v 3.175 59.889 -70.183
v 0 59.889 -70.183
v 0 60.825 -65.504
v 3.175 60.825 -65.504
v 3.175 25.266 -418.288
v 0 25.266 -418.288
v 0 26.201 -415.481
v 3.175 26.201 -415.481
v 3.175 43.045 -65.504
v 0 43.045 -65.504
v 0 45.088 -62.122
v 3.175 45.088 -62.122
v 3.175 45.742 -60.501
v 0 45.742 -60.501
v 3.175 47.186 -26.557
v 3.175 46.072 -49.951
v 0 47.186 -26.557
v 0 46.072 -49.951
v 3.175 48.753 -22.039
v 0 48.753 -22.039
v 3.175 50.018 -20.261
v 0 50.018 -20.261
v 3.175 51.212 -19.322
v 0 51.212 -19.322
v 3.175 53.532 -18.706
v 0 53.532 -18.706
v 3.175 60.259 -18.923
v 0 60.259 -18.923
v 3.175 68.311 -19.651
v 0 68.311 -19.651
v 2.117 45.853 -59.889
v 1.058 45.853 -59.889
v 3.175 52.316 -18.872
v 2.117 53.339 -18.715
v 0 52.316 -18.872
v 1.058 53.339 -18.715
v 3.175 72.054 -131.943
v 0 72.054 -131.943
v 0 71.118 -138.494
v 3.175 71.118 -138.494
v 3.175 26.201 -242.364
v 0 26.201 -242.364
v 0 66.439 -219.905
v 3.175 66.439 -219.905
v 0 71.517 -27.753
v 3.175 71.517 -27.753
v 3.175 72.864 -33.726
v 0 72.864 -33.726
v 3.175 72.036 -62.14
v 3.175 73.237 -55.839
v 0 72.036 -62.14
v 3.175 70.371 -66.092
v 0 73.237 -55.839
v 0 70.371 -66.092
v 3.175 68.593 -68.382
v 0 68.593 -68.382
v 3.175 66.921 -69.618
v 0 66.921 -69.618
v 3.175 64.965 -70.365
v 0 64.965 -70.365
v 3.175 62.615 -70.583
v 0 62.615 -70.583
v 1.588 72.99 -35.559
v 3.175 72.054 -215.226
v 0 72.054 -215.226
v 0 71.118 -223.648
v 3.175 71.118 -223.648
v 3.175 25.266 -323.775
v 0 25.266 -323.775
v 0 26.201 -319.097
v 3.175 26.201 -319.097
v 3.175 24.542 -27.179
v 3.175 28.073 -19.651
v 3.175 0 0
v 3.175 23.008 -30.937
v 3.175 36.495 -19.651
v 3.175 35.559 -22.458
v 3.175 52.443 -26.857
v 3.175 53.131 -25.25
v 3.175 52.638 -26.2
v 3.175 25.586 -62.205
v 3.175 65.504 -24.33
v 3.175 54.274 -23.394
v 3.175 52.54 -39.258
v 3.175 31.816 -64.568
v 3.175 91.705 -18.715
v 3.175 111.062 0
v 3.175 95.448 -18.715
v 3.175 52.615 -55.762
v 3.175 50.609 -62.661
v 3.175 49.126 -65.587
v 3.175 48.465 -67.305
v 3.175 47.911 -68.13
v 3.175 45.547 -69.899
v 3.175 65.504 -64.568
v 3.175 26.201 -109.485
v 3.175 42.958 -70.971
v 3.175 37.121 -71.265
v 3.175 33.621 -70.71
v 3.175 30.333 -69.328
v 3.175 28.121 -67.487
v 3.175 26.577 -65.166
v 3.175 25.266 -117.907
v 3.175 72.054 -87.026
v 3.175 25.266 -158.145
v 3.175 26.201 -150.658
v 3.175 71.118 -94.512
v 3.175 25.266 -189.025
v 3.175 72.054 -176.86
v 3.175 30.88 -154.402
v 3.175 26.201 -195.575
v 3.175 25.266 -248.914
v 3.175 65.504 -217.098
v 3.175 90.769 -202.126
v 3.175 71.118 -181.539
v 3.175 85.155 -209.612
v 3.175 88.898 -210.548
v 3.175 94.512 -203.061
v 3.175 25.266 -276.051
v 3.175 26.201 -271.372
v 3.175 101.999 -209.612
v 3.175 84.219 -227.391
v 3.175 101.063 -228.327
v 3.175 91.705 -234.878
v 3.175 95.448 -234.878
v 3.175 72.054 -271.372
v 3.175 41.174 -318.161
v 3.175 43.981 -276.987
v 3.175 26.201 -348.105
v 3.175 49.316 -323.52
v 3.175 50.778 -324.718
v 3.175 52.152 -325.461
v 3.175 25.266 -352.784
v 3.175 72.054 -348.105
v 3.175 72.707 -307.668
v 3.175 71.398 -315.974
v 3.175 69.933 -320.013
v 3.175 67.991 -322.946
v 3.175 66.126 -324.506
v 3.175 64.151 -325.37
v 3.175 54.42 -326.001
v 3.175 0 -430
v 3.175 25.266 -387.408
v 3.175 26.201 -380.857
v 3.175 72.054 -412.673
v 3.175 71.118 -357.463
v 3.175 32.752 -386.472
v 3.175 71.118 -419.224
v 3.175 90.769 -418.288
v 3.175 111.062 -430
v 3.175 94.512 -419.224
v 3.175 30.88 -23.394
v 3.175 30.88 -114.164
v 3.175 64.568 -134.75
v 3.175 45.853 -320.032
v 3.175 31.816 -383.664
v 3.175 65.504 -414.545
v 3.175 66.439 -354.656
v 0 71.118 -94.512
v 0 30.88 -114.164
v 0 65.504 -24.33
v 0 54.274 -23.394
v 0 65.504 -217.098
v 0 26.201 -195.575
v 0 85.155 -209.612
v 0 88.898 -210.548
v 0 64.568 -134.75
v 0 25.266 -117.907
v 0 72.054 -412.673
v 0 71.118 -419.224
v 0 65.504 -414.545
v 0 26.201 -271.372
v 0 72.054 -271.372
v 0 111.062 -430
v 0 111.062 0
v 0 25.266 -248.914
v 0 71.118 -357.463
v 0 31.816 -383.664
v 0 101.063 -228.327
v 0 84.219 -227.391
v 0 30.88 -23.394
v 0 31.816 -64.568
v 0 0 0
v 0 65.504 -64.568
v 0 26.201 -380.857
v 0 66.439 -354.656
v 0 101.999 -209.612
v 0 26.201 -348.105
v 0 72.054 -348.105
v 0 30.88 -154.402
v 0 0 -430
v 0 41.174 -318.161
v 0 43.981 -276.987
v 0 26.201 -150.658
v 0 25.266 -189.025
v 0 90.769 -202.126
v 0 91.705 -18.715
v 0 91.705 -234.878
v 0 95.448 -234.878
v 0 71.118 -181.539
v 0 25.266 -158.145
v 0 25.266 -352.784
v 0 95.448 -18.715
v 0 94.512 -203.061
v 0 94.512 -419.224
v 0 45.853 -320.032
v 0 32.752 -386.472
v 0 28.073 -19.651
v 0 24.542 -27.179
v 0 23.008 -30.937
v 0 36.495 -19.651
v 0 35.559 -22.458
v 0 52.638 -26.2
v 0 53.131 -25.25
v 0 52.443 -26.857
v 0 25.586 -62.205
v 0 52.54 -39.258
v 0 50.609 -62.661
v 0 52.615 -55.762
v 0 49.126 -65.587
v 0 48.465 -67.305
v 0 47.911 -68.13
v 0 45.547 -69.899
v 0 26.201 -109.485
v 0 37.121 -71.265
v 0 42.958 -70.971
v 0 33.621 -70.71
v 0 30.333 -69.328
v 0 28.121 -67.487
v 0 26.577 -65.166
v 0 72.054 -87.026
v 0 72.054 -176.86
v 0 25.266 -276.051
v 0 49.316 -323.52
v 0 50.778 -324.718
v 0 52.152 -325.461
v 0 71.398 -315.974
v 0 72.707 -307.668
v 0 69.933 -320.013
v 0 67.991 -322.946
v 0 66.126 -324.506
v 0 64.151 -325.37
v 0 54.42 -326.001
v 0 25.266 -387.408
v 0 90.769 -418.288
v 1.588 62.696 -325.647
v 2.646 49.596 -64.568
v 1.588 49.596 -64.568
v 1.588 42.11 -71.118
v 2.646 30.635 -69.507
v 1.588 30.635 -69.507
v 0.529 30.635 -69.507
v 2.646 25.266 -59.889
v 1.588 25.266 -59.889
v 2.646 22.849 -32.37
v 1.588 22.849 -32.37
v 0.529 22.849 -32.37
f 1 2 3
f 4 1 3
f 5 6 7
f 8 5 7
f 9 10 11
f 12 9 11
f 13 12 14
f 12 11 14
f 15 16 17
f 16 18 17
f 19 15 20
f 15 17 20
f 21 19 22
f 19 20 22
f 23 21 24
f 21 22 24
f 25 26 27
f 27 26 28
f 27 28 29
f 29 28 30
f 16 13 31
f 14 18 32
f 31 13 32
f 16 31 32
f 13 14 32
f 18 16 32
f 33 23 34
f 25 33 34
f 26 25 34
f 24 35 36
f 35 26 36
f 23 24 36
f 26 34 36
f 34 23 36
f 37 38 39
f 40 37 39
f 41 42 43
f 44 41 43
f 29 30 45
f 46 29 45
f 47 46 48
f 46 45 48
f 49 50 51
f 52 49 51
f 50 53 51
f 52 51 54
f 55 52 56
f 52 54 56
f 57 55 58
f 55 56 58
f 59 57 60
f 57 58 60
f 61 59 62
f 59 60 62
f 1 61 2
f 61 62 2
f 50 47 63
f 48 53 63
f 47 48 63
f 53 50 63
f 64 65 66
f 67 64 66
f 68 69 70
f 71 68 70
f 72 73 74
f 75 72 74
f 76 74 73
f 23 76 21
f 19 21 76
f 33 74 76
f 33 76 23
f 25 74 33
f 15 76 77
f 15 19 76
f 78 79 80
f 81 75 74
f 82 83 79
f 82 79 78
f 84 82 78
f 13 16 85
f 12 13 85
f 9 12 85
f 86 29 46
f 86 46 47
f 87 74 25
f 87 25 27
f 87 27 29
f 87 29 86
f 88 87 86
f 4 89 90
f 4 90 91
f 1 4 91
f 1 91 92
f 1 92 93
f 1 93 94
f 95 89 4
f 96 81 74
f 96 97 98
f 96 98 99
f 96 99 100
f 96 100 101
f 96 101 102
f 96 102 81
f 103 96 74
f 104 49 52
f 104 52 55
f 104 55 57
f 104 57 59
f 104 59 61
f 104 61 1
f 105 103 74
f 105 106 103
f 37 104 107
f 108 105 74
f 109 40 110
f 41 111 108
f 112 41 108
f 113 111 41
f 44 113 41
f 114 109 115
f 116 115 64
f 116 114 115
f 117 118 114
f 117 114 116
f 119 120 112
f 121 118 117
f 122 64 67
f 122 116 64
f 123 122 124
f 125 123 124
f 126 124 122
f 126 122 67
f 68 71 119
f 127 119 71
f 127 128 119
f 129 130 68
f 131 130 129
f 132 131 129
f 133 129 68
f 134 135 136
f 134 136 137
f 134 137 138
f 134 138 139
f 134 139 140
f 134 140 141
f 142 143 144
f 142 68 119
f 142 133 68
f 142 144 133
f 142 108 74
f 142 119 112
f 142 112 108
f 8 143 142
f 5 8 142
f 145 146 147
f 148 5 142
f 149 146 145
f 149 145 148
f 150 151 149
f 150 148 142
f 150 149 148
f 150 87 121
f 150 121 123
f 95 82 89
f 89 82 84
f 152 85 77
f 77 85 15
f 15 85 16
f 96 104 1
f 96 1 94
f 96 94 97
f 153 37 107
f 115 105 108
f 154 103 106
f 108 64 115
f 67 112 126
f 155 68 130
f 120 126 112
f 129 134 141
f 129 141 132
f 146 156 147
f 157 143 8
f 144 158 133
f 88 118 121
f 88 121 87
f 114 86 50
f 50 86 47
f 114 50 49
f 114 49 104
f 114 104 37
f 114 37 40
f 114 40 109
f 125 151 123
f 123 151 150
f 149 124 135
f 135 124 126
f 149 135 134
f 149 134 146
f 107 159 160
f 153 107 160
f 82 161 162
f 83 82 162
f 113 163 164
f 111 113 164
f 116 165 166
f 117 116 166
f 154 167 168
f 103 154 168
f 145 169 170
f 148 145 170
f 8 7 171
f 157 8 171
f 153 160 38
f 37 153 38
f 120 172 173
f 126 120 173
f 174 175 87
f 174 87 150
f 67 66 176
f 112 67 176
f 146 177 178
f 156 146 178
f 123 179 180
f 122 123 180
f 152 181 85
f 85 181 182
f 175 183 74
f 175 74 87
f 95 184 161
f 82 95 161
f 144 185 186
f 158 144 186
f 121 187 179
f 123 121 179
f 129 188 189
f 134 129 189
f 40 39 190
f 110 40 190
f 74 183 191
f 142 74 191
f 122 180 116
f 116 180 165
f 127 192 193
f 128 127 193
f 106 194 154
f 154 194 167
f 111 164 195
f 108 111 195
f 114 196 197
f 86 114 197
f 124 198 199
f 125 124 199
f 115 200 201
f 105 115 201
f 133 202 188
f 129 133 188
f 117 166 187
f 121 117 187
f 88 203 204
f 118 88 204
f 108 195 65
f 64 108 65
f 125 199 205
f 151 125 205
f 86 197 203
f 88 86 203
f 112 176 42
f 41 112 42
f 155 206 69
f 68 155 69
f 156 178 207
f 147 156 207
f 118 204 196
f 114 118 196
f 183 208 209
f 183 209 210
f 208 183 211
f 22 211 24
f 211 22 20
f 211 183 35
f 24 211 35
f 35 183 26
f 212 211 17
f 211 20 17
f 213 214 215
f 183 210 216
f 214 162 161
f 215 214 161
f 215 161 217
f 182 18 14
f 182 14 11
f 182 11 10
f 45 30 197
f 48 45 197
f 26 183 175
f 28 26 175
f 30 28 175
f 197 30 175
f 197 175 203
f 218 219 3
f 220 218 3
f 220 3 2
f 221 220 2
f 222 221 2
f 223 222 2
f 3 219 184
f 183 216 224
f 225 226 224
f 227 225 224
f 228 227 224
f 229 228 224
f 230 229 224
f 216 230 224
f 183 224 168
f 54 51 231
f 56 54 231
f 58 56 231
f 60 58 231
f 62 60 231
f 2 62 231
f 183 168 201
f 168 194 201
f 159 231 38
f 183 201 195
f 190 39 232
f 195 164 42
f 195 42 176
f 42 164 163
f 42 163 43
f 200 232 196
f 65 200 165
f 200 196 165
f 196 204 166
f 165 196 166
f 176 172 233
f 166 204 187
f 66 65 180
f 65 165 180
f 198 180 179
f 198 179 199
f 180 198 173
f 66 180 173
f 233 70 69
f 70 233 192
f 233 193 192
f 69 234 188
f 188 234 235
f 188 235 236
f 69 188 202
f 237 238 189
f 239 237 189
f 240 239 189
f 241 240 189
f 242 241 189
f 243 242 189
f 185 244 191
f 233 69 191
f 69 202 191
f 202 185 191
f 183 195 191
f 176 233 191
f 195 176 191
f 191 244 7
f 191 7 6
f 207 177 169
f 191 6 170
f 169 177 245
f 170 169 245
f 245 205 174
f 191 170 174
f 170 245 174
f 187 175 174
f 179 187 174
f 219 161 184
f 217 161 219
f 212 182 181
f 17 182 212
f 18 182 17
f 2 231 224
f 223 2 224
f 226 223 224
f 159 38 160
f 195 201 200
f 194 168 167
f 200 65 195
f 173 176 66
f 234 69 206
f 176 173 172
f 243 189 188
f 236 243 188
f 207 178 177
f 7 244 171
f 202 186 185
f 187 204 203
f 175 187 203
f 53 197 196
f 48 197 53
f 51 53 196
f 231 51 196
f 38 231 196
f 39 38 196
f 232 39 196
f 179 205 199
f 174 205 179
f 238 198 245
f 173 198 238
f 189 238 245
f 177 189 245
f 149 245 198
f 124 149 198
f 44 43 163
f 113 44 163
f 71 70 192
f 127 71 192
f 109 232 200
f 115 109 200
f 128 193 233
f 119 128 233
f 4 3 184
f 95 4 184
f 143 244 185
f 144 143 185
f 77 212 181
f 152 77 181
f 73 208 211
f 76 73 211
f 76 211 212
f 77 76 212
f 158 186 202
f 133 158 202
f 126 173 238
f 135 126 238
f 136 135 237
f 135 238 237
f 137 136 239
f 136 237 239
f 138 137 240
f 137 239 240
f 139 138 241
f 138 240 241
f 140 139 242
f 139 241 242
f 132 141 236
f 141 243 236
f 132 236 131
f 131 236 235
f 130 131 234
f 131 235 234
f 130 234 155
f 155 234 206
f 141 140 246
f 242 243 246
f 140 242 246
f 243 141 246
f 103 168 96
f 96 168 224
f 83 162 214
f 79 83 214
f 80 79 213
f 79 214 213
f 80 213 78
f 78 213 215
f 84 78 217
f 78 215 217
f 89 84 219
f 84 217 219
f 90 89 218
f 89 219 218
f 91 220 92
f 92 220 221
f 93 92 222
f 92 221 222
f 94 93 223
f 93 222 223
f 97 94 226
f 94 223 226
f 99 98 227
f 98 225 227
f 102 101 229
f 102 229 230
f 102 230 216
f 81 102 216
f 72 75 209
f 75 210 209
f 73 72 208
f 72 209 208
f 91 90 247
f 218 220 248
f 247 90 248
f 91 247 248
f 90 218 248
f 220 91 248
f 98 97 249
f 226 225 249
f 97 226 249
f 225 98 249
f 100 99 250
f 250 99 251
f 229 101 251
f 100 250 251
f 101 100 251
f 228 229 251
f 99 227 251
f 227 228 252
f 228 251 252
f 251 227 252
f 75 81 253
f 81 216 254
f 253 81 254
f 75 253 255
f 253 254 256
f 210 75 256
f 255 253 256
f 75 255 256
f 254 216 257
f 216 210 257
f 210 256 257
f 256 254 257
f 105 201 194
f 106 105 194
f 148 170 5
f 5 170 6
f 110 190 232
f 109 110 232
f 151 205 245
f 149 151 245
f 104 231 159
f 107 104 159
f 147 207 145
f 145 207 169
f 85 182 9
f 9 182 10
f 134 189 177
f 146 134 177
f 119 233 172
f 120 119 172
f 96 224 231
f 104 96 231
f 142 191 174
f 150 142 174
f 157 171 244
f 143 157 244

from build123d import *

# Parameters (mm, degrees)
SKETCH1_W           = 430
SKETCH1_H           = 111.062117558
BOSS_EXTRUDE1_DEPTH = 3.175


with BuildPart() as part:
    # Sketch1 → Boss-Extrude1 (new body)
    with BuildSketch(Plane(origin=(0, 0, 0), x_dir=(0, 0, -1), z_dir=(1, 0, 0))):
        with Locations((215, 55.531058779)):
            Rectangle(SKETCH1_W, SKETCH1_H)
        Polygon((209.611812117, 101.998605003), (228.327152485, 101.062837985), (227.391385466, 84.219031654), (209.611812117, 85.154798673), (210.547579135, 88.897866746), align=None, mode=Mode.SUBTRACT)
        Polygon((18.715340368, 95.448235875), (203.061442988, 94.512468856), (202.12567597, 90.769400783), (18.715340368, 91.705167801), align=None, mode=Mode.SUBTRACT)
        Polygon((234.877521613, 95.448235875), (419.223624234, 94.512468856), (418.287857216, 90.769400783), (234.877521613, 91.705167801), align=None, mode=Mode.SUBTRACT)
        with BuildLine():
            Line((70.182526378, 59.889089176), (65.503691287, 60.824856195))
            Line((65.503691287, 60.824856195), (64.567924268, 65.503691287))
            Line((64.567924268, 65.503691287), (24.329942478, 65.503691287))
            Line((24.329942478, 65.503691287), (23.394175459, 54.274487066))
            add(Edge.make_bspline(
                [(23.394175459, 54.274487066), (24.641864817, 53.650642387), (25.748281051, 52.532158841), (27.137243533, 52.402953029), (39.595393057, 51.244055399), (53.839027976, 56.032989749), (64.567924268, 49.595651974), (65.764091836, 48.877951433), (67.39240534, 48.773931653), (68.310992342, 47.724117937), (69.688872844, 46.149397364), (70.887222202, 44.189156581), (71.118293397, 42.109515827), (72.101578234, 33.259952297), (69.581527607, 25.974912308), (59.889089176, 25.265709496), (22.729411632, 22.5467087), (37.078345638, 20.604194158), (19.651107386, 28.073010551)],
                knots=[0, 0, 0, 0, 1, 1, 1, 2, 2, 2, 3, 3, 3, 4, 4, 4, 5, 5, 5, 6, 6, 6, 6], degree=3))
            Line((19.651107386, 28.073010551), (19.651107386, 36.494913717))
            Line((19.651107386, 36.494913717), (22.458408441, 35.559146698))
            Line((22.458408441, 35.559146698), (23.394175459, 30.880311607))
            Line((23.394175459, 30.880311607), (64.567924268, 31.816078625))
            Line((64.567924268, 31.816078625), (65.503691287, 43.045282845))
            add(Edge.make_bspline(
                [(65.503691287, 43.045282845), (63.63215725, 43.981049864), (61.968147228, 45.616327304), (59.889089176, 45.852583901), (49.377809759, 47.047047471), (19.236306893, 42.919389546), (18.715340368, 53.338720048), (18.465627539, 58.332976628), (19.339185047, 63.32023491), (19.651107386, 68.310992342)],
                knots=[0, 0, 0, 0, 1, 1, 1, 2, 2, 2, 3, 3, 3, 3], degree=3))
            add(Edge.make_bspline(
                [(19.651107386, 68.310992342), (24.731477432, 70.48829379), (30.033684854, 72.848148925), (35.559146698, 72.989827434), (41.574454702, 73.1440661), (74.601628044, 77.565495837), (70.182526378, 59.889089176)],
                knots=[0, 0, 0, 0, 1, 1, 1, 2, 2, 2, 2], degree=3))
        make_face(mode=Mode.SUBTRACT)
        Polygon((87.026332709, 72.054060415), (94.512468856, 71.118293397), (114.163576242, 30.880311607), (131.943149592, 72.054060415), (138.49351872, 71.118293397), (154.401558033, 30.880311607), (176.859966474, 72.054060415), (181.538801566, 71.118293397), (158.144626106, 25.265709496), (150.658489959, 26.201476515), (134.750450647, 64.567924268), (117.906644316, 25.265709496), (109.48474115, 26.201476515), align=None, mode=Mode.SUBTRACT)
        Polygon((215.226414227, 72.054060415), (223.648317393, 71.118293397), (248.914026889, 25.265709496), (242.36365776, 26.201476515), (219.905249319, 66.439458305), (217.097948264, 65.503691287), (195.575306841, 26.201476515), (189.024937713, 25.265709496), align=None, mode=Mode.SUBTRACT)
        with BuildLine():
            Line((320.032320286, 45.852583901), (323.775388359, 25.265709496))
            Line((323.775388359, 25.265709496), (319.096553267, 26.201476515))
            Line((319.096553267, 26.201476515), (318.160786249, 41.173748809))
            Line((318.160786249, 41.173748809), (276.98703744, 43.981049864))
            Line((276.98703744, 43.981049864), (276.051270422, 25.265709496))
            Line((276.051270422, 25.265709496), (271.37243533, 26.201476515))
            Line((271.37243533, 26.201476515), (271.37243533, 72.054060415))
            add(Edge.make_bspline(
                [(271.37243533, 72.054060415), (287.506192288, 71.724800069), (324.056750843, 77.803019989), (325.646922396, 62.696390231), (326.851803922, 51.25001574), (325.818749624, 51.639013239), (320.032320286, 45.852583901)],
                knots=[0, 0, 0, 0, 1, 1, 1, 2, 2, 2, 2], degree=3))
        make_face(mode=Mode.SUBTRACT)
        Polygon((348.105330837, 72.054060415), (357.463001021, 71.118293397), (383.664477536, 31.816078625), (386.471778591, 32.751845643), (412.673255105, 72.054060415), (419.223624234, 71.118293397), (418.287857216, 25.265709496), (415.480556161, 26.201476515), (414.544789142, 65.503691287), (387.407545609, 25.265709496), (380.857176481, 26.201476515), (354.655699966, 66.439458305), (352.784165929, 25.265709496), (348.105330837, 26.201476515), align=None, mode=Mode.SUBTRACT)
    extrude(amount=BOSS_EXTRUDE1_DEPTH)


solid = part.part
